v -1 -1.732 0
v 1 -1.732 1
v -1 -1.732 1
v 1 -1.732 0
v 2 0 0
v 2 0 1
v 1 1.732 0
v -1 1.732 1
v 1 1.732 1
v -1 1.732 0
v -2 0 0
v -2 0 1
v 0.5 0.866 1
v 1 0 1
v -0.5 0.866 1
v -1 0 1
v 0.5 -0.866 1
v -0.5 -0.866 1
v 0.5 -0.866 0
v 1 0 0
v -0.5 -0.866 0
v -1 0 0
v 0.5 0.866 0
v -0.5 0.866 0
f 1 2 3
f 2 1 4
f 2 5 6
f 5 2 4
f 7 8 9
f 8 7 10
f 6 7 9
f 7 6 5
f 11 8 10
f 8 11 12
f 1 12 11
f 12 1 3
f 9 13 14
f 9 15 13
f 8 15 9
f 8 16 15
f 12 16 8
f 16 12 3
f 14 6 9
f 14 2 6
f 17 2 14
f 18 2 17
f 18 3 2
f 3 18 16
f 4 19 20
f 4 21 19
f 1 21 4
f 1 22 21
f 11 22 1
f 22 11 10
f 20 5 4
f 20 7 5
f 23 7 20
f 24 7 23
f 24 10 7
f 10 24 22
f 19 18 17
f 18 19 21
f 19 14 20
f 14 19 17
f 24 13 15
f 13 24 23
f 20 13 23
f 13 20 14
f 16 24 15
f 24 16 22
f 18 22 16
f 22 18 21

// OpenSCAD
///< Honeycomb Generator


thickness = 1;
height    = 5;
radius    = 1;

module cell( height, radius, thickness=1, open=true ){
       h_adjust = open ? 1 : 0;
       difference(){
	cylinder( h=height, r=radius, $fn=6 );
	color("blue")cylinder( h=height, r=radius-thickness, $fn=6 );
	}
}

///cell( height, radius, thickness );

cell( 1, 2, 1 );
